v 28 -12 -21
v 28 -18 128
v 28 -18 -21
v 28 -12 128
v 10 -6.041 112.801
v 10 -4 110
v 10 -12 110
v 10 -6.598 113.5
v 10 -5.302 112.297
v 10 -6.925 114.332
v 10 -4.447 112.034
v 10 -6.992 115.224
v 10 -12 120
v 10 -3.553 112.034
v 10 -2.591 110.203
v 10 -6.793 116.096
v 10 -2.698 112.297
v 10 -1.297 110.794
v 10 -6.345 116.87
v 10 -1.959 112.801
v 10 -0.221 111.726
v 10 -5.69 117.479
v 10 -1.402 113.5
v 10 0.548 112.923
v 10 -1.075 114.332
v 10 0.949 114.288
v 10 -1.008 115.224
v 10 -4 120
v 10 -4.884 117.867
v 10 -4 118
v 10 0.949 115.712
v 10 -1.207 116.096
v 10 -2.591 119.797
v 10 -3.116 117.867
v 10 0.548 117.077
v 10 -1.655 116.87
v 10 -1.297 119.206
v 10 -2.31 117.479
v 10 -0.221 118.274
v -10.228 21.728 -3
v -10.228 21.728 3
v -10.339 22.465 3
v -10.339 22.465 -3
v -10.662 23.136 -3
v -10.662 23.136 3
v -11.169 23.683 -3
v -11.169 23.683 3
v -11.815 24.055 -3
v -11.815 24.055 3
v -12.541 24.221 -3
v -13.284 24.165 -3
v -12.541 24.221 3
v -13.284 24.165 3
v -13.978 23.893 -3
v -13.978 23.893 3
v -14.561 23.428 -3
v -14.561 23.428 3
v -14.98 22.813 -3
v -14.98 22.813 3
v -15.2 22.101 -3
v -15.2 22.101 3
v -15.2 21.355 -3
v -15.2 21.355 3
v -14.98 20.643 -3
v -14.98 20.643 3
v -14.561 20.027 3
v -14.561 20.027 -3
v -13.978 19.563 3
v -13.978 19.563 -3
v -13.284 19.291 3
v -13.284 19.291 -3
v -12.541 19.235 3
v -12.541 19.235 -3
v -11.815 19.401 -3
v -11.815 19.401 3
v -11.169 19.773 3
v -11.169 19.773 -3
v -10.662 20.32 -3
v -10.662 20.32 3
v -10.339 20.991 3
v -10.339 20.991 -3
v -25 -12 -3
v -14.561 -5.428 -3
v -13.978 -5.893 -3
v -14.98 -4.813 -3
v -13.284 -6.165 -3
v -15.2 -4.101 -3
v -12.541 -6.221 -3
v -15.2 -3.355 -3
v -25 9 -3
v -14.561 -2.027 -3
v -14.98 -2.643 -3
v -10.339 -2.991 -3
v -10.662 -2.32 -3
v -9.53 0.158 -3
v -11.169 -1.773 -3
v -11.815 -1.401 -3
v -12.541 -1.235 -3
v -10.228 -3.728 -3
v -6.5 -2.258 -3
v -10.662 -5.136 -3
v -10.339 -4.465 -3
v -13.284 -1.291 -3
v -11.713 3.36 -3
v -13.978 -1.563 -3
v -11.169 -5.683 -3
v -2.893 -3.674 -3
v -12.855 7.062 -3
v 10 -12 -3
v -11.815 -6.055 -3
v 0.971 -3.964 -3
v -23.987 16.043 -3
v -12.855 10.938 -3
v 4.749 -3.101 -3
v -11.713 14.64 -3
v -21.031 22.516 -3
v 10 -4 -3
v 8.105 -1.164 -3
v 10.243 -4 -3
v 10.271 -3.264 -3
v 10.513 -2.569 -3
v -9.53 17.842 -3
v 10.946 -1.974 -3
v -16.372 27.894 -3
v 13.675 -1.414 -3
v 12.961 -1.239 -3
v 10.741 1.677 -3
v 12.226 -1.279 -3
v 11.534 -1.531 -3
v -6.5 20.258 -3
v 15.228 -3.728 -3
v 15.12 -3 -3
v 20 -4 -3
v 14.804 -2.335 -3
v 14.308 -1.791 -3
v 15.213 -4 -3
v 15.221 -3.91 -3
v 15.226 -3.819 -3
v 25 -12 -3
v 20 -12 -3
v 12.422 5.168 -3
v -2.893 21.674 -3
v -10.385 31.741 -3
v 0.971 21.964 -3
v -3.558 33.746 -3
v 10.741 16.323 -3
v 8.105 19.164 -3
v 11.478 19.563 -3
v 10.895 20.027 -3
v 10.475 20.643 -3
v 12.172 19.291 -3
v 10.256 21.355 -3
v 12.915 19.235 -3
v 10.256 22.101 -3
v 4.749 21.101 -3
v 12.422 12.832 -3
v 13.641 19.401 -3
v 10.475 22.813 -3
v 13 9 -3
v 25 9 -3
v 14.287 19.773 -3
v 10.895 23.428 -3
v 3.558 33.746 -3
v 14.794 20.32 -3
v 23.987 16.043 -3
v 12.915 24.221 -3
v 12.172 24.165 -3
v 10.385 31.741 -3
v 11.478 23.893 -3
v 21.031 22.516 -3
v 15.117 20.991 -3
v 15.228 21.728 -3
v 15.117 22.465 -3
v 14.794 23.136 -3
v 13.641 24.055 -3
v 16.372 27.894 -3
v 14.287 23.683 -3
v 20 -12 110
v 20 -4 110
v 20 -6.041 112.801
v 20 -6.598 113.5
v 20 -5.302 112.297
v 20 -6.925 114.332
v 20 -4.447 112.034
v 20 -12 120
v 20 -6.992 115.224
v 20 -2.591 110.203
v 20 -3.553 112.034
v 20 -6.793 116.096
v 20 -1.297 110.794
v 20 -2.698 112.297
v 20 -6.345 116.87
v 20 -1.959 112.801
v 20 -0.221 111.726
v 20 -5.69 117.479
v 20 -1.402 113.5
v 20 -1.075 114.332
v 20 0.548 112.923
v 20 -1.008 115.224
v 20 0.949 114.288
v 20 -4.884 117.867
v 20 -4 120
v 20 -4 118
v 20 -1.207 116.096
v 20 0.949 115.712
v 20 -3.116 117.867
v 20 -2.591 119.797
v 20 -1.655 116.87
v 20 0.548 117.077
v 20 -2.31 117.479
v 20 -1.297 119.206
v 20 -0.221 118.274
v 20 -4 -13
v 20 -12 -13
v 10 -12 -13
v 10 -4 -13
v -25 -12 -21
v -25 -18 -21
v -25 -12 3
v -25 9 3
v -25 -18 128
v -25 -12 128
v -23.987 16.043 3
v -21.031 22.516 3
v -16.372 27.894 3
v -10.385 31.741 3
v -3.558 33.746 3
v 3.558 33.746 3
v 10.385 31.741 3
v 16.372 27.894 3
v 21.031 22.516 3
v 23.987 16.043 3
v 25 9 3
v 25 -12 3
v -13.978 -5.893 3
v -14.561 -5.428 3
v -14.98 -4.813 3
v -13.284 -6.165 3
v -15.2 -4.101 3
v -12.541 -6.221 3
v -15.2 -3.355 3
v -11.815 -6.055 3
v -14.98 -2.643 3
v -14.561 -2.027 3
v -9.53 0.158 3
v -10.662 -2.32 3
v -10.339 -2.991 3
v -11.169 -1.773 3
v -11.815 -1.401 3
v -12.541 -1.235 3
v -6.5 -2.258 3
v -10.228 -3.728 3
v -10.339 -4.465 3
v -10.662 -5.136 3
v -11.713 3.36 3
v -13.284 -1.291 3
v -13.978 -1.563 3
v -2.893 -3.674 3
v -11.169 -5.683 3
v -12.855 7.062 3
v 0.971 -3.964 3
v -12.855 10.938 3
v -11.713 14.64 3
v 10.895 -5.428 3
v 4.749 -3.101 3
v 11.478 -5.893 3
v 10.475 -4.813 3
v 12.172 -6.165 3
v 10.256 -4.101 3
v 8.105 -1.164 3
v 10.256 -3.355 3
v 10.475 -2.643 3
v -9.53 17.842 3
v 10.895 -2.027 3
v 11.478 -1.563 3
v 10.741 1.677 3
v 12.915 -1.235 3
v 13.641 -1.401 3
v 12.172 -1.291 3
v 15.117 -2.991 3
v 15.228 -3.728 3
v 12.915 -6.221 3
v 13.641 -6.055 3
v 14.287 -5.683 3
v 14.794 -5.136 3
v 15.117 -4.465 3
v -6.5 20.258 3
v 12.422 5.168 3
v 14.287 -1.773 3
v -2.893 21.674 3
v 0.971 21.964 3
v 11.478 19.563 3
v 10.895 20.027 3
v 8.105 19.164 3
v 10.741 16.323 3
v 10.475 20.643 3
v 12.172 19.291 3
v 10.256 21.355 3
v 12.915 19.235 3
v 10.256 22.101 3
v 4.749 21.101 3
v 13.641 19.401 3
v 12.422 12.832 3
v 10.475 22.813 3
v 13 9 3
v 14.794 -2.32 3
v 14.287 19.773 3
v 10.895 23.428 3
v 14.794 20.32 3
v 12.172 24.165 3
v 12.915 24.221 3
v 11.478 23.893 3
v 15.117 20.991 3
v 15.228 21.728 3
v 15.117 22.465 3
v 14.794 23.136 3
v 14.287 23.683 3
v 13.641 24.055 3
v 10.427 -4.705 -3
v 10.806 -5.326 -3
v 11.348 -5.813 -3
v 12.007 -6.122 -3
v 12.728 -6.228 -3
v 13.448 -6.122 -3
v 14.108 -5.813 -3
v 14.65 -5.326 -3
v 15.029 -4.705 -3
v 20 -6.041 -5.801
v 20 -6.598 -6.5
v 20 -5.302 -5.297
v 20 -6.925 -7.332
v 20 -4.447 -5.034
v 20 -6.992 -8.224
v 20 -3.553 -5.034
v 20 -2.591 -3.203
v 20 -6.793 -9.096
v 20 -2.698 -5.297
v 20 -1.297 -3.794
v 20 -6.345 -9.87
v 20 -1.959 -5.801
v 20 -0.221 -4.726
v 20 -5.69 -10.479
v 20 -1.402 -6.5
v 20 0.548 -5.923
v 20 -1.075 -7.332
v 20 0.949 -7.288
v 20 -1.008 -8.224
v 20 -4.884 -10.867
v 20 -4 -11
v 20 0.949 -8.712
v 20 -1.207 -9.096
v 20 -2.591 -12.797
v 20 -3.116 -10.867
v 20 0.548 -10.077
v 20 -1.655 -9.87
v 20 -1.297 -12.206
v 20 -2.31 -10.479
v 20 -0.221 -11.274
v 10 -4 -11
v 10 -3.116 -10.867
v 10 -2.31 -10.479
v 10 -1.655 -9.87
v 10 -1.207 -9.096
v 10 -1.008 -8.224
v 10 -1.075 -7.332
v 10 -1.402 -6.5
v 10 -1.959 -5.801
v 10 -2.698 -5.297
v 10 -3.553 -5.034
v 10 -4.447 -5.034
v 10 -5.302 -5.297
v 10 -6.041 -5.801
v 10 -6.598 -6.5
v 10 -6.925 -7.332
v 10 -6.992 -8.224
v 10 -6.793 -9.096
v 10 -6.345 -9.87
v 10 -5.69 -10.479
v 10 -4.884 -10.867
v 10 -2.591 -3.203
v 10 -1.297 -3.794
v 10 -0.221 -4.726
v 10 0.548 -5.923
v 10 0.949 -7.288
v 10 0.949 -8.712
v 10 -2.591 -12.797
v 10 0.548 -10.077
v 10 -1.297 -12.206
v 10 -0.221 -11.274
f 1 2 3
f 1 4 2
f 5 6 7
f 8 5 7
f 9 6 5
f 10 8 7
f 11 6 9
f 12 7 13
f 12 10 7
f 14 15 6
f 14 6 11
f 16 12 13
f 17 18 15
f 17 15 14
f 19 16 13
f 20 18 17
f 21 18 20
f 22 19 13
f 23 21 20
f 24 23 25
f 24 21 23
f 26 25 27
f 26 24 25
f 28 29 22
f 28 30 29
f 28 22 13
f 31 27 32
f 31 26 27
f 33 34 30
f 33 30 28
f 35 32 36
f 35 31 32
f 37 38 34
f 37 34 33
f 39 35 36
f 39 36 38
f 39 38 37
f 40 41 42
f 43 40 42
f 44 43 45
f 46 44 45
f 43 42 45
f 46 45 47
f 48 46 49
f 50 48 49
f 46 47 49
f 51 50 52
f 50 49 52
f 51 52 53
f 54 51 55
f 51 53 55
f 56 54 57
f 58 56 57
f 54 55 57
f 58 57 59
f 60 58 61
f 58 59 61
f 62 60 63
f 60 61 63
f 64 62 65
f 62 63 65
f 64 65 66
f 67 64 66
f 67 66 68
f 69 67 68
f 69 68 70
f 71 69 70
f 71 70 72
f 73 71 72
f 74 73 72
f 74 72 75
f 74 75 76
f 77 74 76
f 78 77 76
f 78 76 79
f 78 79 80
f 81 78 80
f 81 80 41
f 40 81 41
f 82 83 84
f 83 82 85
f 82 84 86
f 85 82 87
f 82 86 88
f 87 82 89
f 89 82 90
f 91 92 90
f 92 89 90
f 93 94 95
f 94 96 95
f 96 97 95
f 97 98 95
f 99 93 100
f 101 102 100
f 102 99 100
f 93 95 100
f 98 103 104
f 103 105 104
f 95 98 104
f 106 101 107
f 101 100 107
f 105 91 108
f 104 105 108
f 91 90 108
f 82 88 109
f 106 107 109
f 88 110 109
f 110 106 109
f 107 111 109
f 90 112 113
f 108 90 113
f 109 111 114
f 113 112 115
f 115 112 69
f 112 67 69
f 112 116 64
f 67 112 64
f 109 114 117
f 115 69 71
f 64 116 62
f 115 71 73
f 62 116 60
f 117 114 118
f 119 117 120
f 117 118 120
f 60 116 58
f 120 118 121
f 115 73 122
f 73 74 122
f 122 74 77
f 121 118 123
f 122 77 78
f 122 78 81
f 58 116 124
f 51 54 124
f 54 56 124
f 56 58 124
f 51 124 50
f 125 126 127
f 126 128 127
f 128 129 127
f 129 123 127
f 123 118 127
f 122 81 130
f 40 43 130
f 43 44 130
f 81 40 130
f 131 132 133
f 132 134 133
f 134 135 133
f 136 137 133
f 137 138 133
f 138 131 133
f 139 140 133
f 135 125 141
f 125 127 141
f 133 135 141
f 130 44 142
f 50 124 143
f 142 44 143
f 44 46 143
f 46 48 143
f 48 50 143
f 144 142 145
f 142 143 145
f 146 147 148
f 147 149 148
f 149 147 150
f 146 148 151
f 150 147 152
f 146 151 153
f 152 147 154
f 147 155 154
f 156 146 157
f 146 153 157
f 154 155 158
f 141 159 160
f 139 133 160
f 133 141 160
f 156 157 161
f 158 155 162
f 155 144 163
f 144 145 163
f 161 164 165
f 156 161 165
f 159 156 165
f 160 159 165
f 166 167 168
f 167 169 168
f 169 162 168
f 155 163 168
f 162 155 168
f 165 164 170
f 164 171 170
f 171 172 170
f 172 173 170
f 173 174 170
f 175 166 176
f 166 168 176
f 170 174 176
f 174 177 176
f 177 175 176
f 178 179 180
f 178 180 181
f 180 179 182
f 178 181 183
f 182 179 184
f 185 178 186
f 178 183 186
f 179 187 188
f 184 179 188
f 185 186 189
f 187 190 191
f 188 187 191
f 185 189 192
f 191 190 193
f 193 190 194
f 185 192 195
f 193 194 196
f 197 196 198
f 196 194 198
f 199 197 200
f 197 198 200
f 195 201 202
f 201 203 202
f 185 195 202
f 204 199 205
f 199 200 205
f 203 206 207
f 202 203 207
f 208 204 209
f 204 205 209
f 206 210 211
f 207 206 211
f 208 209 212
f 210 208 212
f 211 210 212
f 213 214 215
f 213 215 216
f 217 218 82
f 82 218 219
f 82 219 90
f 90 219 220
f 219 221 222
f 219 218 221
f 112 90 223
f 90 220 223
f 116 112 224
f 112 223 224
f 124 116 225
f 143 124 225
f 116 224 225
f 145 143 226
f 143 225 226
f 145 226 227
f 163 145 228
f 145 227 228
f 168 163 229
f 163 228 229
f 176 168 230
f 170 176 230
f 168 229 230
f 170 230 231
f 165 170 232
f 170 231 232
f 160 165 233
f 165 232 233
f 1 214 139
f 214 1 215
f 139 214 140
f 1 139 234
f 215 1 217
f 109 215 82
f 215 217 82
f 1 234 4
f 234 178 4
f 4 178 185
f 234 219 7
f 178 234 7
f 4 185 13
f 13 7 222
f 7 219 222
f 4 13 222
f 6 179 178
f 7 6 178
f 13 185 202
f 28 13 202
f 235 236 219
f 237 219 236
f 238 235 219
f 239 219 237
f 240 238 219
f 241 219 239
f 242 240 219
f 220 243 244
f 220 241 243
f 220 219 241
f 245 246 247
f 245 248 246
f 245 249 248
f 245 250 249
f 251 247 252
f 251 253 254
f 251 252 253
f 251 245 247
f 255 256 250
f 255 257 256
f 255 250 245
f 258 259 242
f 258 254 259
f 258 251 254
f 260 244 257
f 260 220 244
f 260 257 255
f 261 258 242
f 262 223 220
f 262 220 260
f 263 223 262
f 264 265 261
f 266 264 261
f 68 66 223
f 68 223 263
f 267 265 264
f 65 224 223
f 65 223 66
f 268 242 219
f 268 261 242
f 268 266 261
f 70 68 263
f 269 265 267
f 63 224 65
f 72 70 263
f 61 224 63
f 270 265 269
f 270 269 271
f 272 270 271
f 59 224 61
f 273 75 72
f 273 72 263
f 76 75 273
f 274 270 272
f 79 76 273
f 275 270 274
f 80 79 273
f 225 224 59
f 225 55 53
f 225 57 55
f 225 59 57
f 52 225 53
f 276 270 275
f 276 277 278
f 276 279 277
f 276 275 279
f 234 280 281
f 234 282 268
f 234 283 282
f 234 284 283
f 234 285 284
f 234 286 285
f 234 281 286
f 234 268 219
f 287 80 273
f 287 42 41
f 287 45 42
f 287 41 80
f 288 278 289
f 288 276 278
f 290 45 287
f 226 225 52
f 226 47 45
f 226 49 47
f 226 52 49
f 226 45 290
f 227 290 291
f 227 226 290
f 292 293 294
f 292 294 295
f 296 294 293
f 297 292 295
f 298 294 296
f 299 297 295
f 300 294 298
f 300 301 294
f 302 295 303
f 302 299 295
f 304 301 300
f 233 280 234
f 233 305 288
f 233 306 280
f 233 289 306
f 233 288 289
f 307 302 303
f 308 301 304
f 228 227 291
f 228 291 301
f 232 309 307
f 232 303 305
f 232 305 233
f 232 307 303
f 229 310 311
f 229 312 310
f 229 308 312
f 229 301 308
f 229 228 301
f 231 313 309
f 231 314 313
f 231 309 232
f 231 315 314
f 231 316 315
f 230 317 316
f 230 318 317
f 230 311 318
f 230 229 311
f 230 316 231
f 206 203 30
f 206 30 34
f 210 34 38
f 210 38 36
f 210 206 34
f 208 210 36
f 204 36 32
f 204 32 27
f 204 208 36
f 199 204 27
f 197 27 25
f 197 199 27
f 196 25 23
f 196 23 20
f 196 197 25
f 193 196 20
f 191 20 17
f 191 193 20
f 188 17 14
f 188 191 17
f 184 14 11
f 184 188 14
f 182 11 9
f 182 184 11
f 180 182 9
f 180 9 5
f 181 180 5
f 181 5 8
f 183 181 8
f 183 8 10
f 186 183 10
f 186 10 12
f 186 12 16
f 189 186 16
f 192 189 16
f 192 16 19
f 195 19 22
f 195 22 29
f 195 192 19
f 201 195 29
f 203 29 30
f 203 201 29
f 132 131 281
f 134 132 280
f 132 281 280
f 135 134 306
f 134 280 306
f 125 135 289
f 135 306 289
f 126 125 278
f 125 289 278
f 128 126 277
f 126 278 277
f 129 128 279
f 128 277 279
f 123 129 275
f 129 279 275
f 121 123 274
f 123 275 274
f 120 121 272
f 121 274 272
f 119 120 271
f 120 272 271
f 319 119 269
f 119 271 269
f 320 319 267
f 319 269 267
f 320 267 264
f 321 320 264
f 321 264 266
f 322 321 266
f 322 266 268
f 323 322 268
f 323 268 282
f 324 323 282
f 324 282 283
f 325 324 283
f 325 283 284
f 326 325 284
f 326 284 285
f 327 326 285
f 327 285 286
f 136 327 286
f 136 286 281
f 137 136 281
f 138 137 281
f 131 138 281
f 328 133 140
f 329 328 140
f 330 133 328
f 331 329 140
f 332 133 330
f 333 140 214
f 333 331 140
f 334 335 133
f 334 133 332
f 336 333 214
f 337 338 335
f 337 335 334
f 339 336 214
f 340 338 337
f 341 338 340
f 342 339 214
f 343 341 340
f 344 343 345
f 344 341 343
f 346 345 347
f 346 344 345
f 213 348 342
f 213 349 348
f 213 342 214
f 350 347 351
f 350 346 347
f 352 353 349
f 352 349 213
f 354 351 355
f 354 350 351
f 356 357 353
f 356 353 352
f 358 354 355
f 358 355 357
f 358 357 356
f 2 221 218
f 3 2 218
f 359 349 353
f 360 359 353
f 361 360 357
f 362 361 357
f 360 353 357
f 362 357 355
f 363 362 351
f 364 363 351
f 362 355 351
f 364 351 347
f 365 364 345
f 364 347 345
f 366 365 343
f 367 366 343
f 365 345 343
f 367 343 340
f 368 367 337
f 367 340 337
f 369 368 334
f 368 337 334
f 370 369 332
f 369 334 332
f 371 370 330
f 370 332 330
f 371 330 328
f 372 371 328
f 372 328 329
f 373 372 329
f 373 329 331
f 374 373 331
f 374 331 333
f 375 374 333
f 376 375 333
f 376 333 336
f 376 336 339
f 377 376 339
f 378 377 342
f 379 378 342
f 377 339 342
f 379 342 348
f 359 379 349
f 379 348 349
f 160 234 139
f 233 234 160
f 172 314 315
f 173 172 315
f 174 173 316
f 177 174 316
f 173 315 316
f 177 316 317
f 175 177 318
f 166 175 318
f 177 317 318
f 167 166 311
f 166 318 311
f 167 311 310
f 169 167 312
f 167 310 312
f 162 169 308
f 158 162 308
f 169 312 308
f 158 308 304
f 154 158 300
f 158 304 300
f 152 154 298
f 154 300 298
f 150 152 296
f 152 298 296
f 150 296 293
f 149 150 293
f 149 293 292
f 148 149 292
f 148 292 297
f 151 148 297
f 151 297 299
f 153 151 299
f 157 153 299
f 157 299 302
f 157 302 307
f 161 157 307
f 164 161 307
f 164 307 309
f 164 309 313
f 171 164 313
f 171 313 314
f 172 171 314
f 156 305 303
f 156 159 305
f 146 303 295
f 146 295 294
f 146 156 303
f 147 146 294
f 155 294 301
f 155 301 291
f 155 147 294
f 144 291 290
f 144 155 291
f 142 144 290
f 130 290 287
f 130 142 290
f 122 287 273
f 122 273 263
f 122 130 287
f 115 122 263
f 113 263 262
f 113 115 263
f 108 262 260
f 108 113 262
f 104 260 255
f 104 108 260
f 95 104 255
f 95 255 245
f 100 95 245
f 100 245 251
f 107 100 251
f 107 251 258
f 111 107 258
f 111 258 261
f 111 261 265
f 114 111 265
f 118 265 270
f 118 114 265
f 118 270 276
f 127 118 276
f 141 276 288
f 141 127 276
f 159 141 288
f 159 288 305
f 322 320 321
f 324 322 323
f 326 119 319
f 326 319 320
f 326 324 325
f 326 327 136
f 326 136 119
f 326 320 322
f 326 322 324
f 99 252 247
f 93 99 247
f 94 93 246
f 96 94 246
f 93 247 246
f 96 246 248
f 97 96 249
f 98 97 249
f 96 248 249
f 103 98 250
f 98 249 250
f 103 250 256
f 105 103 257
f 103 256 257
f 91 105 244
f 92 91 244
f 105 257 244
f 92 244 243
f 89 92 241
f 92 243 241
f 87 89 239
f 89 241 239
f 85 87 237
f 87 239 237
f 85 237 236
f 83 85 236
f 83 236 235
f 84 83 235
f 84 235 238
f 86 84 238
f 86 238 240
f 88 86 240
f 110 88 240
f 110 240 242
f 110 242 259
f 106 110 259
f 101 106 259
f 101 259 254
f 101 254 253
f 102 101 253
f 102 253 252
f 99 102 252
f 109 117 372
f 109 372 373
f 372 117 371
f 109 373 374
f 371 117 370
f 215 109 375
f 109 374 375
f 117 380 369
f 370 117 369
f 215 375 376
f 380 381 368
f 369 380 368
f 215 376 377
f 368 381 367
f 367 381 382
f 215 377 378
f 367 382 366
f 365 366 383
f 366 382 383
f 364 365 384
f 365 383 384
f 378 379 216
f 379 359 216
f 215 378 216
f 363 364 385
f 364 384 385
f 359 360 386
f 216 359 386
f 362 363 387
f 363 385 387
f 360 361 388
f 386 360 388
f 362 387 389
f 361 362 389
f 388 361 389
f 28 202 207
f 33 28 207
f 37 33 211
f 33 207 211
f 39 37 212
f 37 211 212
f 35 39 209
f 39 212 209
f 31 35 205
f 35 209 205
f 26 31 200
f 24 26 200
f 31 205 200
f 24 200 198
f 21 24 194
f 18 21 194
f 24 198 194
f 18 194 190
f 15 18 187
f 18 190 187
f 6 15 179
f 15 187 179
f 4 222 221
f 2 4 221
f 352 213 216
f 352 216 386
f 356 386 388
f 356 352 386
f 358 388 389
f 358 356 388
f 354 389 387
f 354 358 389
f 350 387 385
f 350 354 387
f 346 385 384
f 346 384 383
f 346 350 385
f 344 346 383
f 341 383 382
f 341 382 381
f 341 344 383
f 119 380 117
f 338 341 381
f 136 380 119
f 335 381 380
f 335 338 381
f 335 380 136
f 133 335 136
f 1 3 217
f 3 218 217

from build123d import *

# Parameters (mm, degrees)
CROQUIS1_R              = 13
SALIENTE_EXTRUIR1_DEPTH = 3
CROQUIS2_W              = 50
CROQUIS2_H              = 6
SALIENTE_EXTRUIR2_DEPTH = 9
CROQUIS3_W              = 50
CROQUIS3_H              = 6
SALIENTE_EXTRUIR3_DEPTH = 107
CROQUIS4_W              = 50
CROQUIS4_H              = 6
SALIENTE_EXTRUIR4_DEPTH = 6
CROQUIS5_R              = 2.5
CORTAR_EXTRUIR1_DEPTH   = 116.021737076
CROQUIS6_W              = 50
CROQUIS6_H              = 6
SALIENTE_EXTRUIR5_DEPTH = 18
CROQUIS7_W              = 50
CROQUIS7_H              = 6
SALIENTE_EXTRUIR6_DEPTH = 18
CROQUIS8_R              = 3
SALIENTE_EXTRUIR7_DEPTH = 10
SALIENTE_EXTRUIR8_DEPTH = 3


with BuildPart() as part:
    # Croquis1 → Saliente-Extruir1 (new, symmetric)
    with BuildSketch(Plane.XY):
        with BuildLine():
            Line((25, -9), (-25, -9))
            Line((-25, -9), (-25, 9))
            ThreePointArc((-25, 9), (0, 34), (25, 9))
            Line((25, 9), (25, -9))
        make_face()
        with Locations((0, 9)):
            Circle(CROQUIS1_R, mode=Mode.SUBTRACT)
    extrude(amount=SALIENTE_EXTRUIR1_DEPTH, both=True)

    # Croquis2 → Saliente-Extruir2 (add)
    with BuildSketch(Plane.XZ.offset(9)):
        Rectangle(CROQUIS2_W, CROQUIS2_H)
    extrude(amount=SALIENTE_EXTRUIR2_DEPTH)



with BuildPart() as body_2:
    # Croquis3 → Saliente-Extruir3 (new body)
    with BuildSketch(Plane.XY.offset(3)):
        with Locations((0, -15)):
            Rectangle(CROQUIS3_W, CROQUIS3_H)
    extrude(amount=SALIENTE_EXTRUIR3_DEPTH)


with BuildPart() as part_1:
    add(part.part)

    add(body_2.part)  # Saliente-Extruir4 merges body 2
    # Croquis4 → Saliente-Extruir4 (add)
    with BuildSketch(Plane(origin=(0, 0, 3), x_dir=(-1, 0, 0), z_dir=(0, 0, -1))):
        with Locations((0, -15)):
            Rectangle(CROQUIS4_W, CROQUIS4_H)
    extrude(amount=SALIENTE_EXTRUIR4_DEPTH)

    # Croquis5 → Cortar-Extruir1 (cut, through all)
    with BuildSketch(Plane.XY.offset(3)):
        with Locations((12.727922061, 21.727922061)):
            Circle(CROQUIS5_R)
        with Locations((12.727922061, -3.727922061)):
            Circle(CROQUIS5_R)
        with Locations((-12.727922061, -3.727922061)):
            Circle(CROQUIS5_R)
        with Locations((-12.727922061, 21.727922061)):
            Circle(CROQUIS5_R)
    extrude(amount=-CORTAR_EXTRUIR1_DEPTH, mode=Mode.SUBTRACT)

    # Croquis6 → Saliente-Extruir5 (add)
    with BuildSketch(Plane.XY.offset(110)):
        with Locations((0, -15)):
            Rectangle(CROQUIS6_W, CROQUIS6_H)
    extrude(amount=SALIENTE_EXTRUIR5_DEPTH)

    # Croquis7 → Saliente-Extruir6 (add)
    with BuildSketch(Plane(origin=(0, 0, -3), x_dir=(-1, 0, 0), z_dir=(0, 0, -1))):
        with Locations((0, -15)):
            Rectangle(CROQUIS7_W, CROQUIS7_H)
    extrude(amount=SALIENTE_EXTRUIR6_DEPTH)

    # Croquis8 → Saliente-Extruir7 (add)
    with BuildSketch(Plane(origin=(20, 0, 0), x_dir=(0, 0, -1), z_dir=(1, 0, 0))):
        with BuildLine():
            Line((3, -4), (3, -12))
            Line((3, -12), (13, -12))
            Line((13, -12), (13, -4))
            ThreePointArc((13, -4), (8, 1), (3, -4))
        make_face()
        with Locations((8, -4)):
            Circle(CROQUIS8_R, mode=Mode.SUBTRACT)
    saliente_extruir7 = extrude(amount=-SALIENTE_EXTRUIR7_DEPTH)

    # Simetría1: Saliente-Extruir7 across plane
    add(saliente_extruir7.mirror(Plane(origin=(0, 0, 53.5), x_dir=(1, 0, 0), z_dir=(0, 0, -1))))

    # Croquis9 → Saliente-Extruir8 (add)
    with BuildSketch(Plane(origin=(25, 0, 0), x_dir=(0, 0, -1), z_dir=(1, 0, 0))):
        Polygon((-128, -18), (21, -18), (21, -12), (3, -12), (-128, -12), align=None)
    extrude(amount=SALIENTE_EXTRUIR8_DEPTH)


solid = part_1.part
